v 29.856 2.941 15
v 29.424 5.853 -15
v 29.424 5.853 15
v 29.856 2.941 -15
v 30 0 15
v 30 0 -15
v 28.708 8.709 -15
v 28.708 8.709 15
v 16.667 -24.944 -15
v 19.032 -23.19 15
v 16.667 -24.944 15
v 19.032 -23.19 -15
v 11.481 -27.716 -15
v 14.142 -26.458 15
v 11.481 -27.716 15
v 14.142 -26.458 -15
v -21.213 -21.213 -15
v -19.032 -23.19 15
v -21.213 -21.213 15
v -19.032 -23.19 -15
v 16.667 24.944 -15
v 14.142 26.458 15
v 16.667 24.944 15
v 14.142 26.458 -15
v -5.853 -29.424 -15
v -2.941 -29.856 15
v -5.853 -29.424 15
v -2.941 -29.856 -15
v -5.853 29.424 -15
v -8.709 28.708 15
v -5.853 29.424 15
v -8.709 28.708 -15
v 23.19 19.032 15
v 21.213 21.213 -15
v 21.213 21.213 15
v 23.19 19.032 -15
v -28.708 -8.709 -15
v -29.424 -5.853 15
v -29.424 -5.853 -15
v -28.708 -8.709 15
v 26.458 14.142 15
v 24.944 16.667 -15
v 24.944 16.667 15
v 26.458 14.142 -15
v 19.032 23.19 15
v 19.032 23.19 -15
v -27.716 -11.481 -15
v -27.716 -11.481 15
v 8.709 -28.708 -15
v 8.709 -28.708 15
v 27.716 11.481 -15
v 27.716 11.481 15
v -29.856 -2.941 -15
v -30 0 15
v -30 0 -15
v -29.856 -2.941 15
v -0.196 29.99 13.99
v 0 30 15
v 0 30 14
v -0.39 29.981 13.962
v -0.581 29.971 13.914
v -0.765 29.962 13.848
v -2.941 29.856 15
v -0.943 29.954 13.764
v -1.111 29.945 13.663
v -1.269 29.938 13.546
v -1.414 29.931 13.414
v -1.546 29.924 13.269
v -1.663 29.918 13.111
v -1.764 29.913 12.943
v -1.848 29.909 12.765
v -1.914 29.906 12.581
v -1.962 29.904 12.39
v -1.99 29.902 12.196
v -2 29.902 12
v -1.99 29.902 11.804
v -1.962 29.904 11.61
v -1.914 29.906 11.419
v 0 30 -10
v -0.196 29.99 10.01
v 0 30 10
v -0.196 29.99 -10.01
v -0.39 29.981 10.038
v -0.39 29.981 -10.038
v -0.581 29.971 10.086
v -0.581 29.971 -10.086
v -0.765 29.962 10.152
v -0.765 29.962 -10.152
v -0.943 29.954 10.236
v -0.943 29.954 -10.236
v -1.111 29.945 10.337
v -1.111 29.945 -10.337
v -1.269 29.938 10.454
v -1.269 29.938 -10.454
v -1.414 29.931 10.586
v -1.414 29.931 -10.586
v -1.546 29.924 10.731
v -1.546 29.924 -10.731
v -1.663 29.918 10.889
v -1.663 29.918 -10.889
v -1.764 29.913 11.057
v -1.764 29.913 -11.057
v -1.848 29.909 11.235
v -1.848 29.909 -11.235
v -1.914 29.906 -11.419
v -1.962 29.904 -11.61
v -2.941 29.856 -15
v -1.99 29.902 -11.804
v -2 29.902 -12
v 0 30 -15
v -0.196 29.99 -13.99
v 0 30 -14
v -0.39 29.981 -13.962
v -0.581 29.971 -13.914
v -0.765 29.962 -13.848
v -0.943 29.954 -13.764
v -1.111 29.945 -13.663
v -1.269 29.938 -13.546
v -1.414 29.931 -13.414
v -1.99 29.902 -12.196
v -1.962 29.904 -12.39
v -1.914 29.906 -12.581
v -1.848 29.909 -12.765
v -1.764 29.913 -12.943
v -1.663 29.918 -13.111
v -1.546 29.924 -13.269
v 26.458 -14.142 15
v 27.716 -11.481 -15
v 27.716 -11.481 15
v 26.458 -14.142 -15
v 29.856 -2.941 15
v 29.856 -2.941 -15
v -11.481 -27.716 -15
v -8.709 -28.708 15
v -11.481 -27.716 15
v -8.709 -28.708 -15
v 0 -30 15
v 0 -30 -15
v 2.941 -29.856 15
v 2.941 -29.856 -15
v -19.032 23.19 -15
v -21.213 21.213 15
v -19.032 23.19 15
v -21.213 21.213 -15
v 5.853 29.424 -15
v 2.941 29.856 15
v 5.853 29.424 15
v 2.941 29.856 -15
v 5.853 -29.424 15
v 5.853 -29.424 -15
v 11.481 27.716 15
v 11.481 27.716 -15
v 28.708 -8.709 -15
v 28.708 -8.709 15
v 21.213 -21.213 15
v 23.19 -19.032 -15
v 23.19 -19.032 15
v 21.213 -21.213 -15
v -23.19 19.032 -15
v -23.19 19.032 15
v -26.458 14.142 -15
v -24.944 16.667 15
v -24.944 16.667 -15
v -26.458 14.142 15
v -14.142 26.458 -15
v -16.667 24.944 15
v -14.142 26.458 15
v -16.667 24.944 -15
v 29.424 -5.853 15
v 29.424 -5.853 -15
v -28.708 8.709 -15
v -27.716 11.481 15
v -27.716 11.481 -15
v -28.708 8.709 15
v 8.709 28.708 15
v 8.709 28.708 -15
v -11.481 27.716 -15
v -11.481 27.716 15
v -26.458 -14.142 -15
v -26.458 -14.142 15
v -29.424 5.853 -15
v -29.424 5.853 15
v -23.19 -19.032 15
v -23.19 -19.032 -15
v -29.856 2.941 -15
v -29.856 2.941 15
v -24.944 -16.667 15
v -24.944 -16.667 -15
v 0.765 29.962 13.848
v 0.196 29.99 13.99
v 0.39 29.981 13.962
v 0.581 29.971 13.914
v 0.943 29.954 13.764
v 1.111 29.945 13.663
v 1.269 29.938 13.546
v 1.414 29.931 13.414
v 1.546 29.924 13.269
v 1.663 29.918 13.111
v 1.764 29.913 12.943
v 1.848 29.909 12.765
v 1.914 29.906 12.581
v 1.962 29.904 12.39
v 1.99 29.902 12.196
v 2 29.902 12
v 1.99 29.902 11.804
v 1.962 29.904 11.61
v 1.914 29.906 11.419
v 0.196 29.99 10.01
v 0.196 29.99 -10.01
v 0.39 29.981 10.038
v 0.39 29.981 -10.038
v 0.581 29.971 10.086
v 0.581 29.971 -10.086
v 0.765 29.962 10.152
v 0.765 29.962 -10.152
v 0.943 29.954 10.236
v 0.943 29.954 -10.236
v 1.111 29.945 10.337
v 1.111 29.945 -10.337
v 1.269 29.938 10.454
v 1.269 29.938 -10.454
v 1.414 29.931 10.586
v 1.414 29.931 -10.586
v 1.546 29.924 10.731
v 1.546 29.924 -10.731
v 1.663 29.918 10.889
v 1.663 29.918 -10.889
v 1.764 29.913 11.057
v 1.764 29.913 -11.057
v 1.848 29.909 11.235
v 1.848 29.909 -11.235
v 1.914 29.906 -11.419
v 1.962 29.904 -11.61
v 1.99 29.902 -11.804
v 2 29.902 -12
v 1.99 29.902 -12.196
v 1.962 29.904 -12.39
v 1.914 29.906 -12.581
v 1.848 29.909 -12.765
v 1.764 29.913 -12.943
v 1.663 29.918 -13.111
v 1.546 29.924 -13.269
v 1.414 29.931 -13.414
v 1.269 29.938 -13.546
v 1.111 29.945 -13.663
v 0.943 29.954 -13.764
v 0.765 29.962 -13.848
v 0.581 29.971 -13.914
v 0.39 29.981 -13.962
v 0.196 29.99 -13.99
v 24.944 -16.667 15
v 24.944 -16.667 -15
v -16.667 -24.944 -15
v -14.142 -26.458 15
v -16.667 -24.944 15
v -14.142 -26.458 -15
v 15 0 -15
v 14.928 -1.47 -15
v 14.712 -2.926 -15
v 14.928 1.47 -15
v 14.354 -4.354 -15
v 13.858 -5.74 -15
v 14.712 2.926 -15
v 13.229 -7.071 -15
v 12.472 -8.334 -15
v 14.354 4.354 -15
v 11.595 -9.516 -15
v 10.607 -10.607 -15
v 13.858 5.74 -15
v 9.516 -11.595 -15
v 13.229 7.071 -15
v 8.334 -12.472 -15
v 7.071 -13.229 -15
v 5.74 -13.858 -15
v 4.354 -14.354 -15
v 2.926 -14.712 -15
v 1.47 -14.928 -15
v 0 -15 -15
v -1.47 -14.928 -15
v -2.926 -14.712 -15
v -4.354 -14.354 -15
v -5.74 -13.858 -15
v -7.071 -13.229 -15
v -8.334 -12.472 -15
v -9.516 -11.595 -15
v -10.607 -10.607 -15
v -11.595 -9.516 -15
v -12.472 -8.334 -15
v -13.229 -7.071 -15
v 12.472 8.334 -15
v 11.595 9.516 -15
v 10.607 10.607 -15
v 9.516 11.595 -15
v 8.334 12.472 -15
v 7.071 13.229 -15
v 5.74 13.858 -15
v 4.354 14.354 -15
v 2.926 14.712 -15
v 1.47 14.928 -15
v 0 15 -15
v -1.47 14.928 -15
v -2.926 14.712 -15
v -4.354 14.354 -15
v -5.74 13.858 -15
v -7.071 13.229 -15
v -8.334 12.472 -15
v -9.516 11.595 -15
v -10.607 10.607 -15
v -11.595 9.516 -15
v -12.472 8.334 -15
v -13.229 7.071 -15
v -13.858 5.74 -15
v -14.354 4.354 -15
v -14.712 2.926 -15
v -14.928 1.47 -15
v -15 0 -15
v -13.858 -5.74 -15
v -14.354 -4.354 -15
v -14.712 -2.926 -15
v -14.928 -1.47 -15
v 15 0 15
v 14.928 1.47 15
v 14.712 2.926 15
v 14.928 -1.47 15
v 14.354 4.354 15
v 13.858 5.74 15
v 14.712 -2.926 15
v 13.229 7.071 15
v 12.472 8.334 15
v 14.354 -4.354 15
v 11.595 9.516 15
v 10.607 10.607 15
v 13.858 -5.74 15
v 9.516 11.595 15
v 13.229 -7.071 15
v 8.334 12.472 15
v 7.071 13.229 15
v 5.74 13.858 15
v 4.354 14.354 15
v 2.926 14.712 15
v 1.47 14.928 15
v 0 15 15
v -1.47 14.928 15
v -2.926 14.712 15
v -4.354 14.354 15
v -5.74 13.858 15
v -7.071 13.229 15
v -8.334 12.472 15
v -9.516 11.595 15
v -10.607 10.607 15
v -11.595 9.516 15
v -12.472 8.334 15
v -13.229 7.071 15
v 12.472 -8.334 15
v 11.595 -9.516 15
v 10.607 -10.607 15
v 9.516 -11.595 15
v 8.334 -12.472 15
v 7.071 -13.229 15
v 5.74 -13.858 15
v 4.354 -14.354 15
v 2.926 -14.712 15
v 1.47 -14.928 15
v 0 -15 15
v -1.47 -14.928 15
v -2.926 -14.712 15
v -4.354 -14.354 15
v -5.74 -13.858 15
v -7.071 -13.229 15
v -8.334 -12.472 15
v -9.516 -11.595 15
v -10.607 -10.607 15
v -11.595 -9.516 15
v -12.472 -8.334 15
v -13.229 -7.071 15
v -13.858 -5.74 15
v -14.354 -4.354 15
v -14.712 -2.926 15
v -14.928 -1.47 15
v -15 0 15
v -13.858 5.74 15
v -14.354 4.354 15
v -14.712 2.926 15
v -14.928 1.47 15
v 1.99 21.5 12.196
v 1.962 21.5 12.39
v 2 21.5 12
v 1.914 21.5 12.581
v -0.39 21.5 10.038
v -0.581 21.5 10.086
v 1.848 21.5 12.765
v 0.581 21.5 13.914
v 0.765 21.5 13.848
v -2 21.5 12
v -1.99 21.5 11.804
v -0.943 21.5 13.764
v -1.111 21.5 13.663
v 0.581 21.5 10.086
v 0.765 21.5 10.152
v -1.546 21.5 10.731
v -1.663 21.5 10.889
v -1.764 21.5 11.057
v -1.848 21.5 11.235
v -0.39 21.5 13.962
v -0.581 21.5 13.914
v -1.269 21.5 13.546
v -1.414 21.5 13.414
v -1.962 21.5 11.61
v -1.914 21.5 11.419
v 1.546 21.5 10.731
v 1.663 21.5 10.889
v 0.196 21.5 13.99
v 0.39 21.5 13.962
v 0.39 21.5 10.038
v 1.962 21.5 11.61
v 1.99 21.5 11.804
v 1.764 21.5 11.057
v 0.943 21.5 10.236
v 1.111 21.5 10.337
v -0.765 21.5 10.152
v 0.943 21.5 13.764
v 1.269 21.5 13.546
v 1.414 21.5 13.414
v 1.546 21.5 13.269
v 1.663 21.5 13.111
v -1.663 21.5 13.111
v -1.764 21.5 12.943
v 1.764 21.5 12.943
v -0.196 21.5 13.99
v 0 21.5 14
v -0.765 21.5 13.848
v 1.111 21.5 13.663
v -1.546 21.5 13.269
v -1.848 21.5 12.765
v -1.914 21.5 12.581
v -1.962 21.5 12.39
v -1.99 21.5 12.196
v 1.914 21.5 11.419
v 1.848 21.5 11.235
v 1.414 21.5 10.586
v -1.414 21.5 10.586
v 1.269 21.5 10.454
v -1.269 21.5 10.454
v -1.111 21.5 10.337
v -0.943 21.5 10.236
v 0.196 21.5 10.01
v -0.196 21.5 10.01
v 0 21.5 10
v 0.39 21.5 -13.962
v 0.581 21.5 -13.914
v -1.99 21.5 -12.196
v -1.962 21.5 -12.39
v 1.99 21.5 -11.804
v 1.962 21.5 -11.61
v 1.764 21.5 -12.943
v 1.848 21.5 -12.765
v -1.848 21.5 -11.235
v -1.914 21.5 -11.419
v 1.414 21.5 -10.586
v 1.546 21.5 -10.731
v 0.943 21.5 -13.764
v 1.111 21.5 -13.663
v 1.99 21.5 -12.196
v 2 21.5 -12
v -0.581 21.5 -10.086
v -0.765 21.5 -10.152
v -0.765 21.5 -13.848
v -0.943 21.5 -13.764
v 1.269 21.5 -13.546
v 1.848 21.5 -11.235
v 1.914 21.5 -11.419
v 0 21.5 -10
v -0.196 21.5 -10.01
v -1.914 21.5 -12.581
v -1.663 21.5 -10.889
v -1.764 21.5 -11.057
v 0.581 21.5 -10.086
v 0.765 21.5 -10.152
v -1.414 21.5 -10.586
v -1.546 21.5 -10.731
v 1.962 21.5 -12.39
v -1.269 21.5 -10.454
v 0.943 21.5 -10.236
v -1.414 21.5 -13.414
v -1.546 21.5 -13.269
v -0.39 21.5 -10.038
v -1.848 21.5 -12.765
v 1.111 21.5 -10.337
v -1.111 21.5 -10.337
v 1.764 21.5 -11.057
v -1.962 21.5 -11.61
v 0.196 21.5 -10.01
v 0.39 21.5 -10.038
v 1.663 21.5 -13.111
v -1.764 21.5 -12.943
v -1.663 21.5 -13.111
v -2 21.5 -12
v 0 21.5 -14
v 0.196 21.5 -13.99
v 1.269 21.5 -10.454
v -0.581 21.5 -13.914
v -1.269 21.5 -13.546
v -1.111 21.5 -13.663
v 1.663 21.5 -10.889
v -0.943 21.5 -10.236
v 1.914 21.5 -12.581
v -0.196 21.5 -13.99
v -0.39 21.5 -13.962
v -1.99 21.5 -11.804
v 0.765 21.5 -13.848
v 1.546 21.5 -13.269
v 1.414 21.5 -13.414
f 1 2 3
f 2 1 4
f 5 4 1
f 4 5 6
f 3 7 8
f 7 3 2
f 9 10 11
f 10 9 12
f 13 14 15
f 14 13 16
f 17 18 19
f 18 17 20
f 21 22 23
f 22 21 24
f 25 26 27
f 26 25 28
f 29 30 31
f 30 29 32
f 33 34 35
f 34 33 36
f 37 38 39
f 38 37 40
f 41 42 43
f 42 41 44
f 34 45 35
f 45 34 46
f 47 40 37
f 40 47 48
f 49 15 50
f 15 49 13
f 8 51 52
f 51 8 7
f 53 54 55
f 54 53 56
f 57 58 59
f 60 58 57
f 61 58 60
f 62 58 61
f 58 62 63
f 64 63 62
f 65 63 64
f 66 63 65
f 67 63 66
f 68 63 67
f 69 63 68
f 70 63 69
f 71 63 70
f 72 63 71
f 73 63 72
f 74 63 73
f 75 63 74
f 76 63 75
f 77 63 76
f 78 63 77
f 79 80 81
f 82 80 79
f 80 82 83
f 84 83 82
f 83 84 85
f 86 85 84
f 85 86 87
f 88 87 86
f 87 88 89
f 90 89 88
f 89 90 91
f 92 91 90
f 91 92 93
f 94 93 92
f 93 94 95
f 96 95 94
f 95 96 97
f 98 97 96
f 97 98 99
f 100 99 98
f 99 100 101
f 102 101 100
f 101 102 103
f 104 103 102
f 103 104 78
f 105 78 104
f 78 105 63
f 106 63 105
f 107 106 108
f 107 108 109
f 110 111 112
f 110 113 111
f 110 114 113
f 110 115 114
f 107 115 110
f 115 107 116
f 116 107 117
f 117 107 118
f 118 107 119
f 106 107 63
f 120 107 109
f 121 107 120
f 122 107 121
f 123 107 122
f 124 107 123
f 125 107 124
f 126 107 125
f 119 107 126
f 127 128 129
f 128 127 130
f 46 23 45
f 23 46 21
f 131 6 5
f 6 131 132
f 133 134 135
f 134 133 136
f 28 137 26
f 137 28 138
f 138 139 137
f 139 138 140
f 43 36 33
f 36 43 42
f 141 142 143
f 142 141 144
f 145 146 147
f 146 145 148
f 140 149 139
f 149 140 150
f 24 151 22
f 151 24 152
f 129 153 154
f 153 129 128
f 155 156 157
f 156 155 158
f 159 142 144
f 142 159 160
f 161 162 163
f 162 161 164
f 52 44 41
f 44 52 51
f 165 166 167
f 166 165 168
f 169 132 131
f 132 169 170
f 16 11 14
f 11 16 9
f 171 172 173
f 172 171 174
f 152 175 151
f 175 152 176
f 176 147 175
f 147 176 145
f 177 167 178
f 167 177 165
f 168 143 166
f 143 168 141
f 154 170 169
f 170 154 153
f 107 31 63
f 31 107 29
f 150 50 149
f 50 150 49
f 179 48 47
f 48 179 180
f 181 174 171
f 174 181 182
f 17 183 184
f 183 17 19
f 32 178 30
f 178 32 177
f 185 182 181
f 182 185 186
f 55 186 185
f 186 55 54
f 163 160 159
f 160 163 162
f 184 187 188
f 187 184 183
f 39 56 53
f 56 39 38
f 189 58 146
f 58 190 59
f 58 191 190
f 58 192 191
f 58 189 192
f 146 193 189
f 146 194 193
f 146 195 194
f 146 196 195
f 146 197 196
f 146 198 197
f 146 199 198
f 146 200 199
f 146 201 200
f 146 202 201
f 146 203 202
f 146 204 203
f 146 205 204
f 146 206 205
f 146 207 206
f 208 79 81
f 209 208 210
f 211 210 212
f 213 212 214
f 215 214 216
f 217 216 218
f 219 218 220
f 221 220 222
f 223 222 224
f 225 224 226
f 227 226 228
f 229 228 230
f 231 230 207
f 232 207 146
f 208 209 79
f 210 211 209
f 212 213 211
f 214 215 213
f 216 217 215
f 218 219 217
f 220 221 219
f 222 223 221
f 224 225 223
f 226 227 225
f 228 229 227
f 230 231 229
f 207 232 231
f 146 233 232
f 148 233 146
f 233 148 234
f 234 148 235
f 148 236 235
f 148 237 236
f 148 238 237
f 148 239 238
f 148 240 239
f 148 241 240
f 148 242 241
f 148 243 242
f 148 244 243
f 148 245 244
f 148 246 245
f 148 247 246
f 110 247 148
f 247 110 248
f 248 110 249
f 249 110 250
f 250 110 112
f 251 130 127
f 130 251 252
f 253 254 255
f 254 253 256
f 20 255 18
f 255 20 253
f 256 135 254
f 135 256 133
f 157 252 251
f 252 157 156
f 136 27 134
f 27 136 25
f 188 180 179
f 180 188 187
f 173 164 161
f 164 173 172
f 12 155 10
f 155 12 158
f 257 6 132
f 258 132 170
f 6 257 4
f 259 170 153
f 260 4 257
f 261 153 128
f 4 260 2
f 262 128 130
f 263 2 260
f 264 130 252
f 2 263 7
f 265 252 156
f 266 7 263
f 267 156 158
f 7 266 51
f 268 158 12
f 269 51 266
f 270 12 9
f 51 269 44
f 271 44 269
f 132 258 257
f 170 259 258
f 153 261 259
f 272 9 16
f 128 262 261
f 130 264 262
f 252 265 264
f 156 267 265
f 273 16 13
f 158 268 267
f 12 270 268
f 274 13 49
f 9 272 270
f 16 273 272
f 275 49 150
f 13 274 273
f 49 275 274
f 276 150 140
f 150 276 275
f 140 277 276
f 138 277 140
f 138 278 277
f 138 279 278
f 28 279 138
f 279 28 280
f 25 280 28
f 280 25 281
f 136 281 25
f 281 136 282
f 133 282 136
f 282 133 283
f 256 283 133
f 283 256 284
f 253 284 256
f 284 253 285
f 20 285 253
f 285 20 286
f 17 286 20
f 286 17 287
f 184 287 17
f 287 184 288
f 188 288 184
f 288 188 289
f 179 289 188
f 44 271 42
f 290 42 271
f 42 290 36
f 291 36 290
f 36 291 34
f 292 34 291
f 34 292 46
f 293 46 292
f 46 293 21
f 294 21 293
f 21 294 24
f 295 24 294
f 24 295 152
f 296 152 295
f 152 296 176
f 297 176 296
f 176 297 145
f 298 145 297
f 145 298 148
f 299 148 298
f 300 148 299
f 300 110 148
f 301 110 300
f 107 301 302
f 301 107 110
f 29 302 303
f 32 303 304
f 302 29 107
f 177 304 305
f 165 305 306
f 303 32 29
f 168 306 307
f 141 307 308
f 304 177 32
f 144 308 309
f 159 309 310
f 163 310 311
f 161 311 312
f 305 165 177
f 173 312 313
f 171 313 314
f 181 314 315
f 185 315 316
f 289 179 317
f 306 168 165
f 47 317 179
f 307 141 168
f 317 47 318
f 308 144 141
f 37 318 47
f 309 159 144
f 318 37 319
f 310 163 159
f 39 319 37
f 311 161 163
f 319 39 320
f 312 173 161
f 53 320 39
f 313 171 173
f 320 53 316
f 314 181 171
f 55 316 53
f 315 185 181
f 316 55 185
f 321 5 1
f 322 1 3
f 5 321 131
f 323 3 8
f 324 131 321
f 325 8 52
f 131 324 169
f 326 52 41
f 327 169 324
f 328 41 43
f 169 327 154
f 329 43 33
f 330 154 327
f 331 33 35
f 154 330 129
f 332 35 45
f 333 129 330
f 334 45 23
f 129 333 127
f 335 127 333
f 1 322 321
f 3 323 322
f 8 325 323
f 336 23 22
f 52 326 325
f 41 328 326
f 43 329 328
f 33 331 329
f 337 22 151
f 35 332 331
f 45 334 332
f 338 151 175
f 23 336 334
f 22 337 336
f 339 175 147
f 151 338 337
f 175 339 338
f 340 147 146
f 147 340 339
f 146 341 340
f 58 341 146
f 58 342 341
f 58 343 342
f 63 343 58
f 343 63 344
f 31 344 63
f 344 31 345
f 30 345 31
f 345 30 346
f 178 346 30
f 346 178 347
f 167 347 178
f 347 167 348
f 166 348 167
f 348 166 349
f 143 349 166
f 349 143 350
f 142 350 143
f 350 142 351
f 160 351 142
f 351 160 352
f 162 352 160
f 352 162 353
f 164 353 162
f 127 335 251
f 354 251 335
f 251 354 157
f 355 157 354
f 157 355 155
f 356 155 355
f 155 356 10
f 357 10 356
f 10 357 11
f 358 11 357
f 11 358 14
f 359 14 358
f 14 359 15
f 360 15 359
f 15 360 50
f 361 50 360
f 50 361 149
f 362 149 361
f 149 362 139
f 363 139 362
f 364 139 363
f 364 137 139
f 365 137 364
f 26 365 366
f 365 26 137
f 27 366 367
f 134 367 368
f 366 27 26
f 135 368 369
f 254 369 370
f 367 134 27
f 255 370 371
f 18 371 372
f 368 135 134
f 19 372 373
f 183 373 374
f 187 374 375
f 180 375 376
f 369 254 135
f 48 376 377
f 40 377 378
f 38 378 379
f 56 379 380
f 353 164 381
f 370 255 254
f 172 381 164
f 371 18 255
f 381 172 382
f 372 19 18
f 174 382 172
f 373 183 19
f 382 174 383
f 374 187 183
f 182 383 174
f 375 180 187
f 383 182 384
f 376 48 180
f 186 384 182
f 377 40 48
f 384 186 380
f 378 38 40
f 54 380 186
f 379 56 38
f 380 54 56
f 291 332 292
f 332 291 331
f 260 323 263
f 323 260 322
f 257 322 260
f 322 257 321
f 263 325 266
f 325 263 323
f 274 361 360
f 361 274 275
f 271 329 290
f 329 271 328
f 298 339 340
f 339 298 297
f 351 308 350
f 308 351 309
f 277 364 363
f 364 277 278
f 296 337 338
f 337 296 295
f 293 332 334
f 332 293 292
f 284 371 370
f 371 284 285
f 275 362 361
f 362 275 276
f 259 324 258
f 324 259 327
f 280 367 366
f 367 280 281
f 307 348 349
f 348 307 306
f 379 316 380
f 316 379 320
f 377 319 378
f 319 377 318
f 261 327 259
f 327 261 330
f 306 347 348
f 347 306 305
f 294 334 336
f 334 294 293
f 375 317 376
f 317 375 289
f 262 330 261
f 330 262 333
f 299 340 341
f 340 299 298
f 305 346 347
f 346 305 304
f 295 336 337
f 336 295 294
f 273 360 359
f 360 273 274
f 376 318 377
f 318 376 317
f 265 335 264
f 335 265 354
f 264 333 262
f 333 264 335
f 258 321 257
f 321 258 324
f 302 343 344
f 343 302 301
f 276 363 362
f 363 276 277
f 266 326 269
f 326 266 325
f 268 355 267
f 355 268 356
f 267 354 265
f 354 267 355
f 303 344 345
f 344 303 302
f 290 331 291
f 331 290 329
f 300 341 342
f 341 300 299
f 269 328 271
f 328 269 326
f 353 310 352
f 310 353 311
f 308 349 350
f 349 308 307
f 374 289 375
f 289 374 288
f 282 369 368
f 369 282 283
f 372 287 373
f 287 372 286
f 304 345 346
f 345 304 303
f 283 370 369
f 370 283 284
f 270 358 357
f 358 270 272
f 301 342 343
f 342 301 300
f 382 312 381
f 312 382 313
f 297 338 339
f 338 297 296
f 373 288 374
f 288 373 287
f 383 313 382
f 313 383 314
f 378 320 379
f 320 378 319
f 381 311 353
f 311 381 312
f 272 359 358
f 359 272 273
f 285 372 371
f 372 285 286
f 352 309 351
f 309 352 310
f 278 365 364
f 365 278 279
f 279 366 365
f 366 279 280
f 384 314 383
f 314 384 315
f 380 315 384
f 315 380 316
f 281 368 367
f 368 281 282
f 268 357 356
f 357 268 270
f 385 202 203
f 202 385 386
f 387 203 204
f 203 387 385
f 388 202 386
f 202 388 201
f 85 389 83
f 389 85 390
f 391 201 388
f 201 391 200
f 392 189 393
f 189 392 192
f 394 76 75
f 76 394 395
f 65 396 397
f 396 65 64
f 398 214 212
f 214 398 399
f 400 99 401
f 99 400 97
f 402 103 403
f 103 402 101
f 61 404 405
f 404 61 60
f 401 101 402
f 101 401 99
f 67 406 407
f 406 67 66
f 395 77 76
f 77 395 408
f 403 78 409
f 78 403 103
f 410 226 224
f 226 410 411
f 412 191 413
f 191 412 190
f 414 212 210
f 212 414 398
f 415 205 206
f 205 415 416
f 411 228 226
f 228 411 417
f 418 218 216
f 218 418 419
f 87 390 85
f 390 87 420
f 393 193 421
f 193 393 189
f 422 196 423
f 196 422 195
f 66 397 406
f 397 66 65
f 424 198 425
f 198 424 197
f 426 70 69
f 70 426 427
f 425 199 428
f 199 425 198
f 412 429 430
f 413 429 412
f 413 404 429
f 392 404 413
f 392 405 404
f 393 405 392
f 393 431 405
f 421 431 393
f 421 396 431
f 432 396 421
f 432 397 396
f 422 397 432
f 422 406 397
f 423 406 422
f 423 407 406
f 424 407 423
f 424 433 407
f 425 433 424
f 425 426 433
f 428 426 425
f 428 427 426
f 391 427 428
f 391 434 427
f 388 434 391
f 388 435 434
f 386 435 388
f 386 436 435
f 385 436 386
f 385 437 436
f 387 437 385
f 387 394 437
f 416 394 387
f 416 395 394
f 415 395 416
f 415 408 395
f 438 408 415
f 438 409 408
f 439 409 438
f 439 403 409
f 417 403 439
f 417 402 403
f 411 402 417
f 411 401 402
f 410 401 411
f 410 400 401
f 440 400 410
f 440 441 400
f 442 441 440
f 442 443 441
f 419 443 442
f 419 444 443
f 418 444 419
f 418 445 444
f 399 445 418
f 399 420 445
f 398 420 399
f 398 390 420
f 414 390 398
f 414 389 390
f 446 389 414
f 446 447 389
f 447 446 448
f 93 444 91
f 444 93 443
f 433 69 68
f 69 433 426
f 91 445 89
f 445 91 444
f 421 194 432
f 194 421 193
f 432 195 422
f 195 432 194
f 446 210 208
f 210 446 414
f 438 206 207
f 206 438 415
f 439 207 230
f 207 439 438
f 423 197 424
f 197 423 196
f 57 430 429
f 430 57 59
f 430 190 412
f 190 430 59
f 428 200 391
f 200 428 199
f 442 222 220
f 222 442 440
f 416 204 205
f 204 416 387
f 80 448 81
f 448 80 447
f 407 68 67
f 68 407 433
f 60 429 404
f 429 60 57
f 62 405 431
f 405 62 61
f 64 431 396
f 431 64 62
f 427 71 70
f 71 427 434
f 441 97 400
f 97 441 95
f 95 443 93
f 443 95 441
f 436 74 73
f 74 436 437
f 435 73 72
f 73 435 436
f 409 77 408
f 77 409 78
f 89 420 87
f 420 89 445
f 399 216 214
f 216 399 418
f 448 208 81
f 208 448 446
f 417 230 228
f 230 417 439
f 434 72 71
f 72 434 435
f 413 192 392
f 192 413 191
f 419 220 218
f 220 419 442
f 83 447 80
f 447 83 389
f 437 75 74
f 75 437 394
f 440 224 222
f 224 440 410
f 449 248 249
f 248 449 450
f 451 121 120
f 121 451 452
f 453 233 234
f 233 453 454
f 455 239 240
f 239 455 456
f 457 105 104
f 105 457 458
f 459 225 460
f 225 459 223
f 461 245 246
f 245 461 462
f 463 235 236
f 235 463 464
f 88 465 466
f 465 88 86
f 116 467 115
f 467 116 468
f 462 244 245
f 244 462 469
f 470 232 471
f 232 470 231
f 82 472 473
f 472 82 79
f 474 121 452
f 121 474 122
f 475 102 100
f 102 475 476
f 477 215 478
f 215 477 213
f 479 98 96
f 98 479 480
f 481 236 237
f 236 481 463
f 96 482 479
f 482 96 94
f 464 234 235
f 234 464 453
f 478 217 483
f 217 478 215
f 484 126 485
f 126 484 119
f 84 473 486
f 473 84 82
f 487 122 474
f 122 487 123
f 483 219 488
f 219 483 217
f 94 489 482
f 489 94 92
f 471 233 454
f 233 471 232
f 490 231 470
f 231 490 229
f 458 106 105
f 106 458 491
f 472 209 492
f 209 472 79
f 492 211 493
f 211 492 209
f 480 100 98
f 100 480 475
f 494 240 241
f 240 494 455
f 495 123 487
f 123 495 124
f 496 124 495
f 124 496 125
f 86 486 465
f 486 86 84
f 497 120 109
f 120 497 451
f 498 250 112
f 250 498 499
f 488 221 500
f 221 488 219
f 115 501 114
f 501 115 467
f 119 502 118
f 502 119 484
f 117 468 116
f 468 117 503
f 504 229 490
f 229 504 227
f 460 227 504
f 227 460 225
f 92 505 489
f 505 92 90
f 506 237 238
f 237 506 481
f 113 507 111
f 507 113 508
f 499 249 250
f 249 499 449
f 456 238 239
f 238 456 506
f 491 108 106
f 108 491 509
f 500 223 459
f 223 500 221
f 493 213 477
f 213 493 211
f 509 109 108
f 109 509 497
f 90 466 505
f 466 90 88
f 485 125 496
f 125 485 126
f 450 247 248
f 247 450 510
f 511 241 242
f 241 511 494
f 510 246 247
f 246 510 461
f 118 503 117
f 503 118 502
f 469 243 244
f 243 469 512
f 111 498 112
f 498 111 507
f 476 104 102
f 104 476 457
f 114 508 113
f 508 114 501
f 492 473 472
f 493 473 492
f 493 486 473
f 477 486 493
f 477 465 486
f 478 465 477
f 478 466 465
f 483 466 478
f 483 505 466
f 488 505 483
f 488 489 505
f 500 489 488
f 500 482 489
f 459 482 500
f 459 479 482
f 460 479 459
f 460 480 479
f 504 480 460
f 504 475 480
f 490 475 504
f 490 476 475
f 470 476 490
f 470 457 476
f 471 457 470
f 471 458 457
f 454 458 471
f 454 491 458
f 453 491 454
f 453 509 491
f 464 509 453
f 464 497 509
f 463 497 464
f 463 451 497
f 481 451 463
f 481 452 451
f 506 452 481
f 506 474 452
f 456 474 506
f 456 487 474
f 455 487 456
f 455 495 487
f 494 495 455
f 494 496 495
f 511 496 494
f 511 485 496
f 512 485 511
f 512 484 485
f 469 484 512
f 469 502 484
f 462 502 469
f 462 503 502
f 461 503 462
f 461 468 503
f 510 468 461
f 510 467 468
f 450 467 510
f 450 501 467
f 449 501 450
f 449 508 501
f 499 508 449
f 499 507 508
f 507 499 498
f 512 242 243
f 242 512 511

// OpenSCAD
// COBRA Vertebra - C1 V0
// Height: 30.0mm, OD: 60.0mm

$fn = 64;

difference() {
    // Outer cylinder
    cylinder(h=30.0, d=60.0, center=true);
    
    // Inner channel
    cylinder(h=32.0, d=30.0, center=true);

    // Pivot holes
    translate([0, 30.0, 12.0])
    rotate([90, 0, 0])
    cylinder(h=17.0, d=4, center=true);
    
    translate([0, 30.0, -12.0])
    rotate([90, 0, 0])
    cylinder(h=17.0, d=4, center=true);
}
